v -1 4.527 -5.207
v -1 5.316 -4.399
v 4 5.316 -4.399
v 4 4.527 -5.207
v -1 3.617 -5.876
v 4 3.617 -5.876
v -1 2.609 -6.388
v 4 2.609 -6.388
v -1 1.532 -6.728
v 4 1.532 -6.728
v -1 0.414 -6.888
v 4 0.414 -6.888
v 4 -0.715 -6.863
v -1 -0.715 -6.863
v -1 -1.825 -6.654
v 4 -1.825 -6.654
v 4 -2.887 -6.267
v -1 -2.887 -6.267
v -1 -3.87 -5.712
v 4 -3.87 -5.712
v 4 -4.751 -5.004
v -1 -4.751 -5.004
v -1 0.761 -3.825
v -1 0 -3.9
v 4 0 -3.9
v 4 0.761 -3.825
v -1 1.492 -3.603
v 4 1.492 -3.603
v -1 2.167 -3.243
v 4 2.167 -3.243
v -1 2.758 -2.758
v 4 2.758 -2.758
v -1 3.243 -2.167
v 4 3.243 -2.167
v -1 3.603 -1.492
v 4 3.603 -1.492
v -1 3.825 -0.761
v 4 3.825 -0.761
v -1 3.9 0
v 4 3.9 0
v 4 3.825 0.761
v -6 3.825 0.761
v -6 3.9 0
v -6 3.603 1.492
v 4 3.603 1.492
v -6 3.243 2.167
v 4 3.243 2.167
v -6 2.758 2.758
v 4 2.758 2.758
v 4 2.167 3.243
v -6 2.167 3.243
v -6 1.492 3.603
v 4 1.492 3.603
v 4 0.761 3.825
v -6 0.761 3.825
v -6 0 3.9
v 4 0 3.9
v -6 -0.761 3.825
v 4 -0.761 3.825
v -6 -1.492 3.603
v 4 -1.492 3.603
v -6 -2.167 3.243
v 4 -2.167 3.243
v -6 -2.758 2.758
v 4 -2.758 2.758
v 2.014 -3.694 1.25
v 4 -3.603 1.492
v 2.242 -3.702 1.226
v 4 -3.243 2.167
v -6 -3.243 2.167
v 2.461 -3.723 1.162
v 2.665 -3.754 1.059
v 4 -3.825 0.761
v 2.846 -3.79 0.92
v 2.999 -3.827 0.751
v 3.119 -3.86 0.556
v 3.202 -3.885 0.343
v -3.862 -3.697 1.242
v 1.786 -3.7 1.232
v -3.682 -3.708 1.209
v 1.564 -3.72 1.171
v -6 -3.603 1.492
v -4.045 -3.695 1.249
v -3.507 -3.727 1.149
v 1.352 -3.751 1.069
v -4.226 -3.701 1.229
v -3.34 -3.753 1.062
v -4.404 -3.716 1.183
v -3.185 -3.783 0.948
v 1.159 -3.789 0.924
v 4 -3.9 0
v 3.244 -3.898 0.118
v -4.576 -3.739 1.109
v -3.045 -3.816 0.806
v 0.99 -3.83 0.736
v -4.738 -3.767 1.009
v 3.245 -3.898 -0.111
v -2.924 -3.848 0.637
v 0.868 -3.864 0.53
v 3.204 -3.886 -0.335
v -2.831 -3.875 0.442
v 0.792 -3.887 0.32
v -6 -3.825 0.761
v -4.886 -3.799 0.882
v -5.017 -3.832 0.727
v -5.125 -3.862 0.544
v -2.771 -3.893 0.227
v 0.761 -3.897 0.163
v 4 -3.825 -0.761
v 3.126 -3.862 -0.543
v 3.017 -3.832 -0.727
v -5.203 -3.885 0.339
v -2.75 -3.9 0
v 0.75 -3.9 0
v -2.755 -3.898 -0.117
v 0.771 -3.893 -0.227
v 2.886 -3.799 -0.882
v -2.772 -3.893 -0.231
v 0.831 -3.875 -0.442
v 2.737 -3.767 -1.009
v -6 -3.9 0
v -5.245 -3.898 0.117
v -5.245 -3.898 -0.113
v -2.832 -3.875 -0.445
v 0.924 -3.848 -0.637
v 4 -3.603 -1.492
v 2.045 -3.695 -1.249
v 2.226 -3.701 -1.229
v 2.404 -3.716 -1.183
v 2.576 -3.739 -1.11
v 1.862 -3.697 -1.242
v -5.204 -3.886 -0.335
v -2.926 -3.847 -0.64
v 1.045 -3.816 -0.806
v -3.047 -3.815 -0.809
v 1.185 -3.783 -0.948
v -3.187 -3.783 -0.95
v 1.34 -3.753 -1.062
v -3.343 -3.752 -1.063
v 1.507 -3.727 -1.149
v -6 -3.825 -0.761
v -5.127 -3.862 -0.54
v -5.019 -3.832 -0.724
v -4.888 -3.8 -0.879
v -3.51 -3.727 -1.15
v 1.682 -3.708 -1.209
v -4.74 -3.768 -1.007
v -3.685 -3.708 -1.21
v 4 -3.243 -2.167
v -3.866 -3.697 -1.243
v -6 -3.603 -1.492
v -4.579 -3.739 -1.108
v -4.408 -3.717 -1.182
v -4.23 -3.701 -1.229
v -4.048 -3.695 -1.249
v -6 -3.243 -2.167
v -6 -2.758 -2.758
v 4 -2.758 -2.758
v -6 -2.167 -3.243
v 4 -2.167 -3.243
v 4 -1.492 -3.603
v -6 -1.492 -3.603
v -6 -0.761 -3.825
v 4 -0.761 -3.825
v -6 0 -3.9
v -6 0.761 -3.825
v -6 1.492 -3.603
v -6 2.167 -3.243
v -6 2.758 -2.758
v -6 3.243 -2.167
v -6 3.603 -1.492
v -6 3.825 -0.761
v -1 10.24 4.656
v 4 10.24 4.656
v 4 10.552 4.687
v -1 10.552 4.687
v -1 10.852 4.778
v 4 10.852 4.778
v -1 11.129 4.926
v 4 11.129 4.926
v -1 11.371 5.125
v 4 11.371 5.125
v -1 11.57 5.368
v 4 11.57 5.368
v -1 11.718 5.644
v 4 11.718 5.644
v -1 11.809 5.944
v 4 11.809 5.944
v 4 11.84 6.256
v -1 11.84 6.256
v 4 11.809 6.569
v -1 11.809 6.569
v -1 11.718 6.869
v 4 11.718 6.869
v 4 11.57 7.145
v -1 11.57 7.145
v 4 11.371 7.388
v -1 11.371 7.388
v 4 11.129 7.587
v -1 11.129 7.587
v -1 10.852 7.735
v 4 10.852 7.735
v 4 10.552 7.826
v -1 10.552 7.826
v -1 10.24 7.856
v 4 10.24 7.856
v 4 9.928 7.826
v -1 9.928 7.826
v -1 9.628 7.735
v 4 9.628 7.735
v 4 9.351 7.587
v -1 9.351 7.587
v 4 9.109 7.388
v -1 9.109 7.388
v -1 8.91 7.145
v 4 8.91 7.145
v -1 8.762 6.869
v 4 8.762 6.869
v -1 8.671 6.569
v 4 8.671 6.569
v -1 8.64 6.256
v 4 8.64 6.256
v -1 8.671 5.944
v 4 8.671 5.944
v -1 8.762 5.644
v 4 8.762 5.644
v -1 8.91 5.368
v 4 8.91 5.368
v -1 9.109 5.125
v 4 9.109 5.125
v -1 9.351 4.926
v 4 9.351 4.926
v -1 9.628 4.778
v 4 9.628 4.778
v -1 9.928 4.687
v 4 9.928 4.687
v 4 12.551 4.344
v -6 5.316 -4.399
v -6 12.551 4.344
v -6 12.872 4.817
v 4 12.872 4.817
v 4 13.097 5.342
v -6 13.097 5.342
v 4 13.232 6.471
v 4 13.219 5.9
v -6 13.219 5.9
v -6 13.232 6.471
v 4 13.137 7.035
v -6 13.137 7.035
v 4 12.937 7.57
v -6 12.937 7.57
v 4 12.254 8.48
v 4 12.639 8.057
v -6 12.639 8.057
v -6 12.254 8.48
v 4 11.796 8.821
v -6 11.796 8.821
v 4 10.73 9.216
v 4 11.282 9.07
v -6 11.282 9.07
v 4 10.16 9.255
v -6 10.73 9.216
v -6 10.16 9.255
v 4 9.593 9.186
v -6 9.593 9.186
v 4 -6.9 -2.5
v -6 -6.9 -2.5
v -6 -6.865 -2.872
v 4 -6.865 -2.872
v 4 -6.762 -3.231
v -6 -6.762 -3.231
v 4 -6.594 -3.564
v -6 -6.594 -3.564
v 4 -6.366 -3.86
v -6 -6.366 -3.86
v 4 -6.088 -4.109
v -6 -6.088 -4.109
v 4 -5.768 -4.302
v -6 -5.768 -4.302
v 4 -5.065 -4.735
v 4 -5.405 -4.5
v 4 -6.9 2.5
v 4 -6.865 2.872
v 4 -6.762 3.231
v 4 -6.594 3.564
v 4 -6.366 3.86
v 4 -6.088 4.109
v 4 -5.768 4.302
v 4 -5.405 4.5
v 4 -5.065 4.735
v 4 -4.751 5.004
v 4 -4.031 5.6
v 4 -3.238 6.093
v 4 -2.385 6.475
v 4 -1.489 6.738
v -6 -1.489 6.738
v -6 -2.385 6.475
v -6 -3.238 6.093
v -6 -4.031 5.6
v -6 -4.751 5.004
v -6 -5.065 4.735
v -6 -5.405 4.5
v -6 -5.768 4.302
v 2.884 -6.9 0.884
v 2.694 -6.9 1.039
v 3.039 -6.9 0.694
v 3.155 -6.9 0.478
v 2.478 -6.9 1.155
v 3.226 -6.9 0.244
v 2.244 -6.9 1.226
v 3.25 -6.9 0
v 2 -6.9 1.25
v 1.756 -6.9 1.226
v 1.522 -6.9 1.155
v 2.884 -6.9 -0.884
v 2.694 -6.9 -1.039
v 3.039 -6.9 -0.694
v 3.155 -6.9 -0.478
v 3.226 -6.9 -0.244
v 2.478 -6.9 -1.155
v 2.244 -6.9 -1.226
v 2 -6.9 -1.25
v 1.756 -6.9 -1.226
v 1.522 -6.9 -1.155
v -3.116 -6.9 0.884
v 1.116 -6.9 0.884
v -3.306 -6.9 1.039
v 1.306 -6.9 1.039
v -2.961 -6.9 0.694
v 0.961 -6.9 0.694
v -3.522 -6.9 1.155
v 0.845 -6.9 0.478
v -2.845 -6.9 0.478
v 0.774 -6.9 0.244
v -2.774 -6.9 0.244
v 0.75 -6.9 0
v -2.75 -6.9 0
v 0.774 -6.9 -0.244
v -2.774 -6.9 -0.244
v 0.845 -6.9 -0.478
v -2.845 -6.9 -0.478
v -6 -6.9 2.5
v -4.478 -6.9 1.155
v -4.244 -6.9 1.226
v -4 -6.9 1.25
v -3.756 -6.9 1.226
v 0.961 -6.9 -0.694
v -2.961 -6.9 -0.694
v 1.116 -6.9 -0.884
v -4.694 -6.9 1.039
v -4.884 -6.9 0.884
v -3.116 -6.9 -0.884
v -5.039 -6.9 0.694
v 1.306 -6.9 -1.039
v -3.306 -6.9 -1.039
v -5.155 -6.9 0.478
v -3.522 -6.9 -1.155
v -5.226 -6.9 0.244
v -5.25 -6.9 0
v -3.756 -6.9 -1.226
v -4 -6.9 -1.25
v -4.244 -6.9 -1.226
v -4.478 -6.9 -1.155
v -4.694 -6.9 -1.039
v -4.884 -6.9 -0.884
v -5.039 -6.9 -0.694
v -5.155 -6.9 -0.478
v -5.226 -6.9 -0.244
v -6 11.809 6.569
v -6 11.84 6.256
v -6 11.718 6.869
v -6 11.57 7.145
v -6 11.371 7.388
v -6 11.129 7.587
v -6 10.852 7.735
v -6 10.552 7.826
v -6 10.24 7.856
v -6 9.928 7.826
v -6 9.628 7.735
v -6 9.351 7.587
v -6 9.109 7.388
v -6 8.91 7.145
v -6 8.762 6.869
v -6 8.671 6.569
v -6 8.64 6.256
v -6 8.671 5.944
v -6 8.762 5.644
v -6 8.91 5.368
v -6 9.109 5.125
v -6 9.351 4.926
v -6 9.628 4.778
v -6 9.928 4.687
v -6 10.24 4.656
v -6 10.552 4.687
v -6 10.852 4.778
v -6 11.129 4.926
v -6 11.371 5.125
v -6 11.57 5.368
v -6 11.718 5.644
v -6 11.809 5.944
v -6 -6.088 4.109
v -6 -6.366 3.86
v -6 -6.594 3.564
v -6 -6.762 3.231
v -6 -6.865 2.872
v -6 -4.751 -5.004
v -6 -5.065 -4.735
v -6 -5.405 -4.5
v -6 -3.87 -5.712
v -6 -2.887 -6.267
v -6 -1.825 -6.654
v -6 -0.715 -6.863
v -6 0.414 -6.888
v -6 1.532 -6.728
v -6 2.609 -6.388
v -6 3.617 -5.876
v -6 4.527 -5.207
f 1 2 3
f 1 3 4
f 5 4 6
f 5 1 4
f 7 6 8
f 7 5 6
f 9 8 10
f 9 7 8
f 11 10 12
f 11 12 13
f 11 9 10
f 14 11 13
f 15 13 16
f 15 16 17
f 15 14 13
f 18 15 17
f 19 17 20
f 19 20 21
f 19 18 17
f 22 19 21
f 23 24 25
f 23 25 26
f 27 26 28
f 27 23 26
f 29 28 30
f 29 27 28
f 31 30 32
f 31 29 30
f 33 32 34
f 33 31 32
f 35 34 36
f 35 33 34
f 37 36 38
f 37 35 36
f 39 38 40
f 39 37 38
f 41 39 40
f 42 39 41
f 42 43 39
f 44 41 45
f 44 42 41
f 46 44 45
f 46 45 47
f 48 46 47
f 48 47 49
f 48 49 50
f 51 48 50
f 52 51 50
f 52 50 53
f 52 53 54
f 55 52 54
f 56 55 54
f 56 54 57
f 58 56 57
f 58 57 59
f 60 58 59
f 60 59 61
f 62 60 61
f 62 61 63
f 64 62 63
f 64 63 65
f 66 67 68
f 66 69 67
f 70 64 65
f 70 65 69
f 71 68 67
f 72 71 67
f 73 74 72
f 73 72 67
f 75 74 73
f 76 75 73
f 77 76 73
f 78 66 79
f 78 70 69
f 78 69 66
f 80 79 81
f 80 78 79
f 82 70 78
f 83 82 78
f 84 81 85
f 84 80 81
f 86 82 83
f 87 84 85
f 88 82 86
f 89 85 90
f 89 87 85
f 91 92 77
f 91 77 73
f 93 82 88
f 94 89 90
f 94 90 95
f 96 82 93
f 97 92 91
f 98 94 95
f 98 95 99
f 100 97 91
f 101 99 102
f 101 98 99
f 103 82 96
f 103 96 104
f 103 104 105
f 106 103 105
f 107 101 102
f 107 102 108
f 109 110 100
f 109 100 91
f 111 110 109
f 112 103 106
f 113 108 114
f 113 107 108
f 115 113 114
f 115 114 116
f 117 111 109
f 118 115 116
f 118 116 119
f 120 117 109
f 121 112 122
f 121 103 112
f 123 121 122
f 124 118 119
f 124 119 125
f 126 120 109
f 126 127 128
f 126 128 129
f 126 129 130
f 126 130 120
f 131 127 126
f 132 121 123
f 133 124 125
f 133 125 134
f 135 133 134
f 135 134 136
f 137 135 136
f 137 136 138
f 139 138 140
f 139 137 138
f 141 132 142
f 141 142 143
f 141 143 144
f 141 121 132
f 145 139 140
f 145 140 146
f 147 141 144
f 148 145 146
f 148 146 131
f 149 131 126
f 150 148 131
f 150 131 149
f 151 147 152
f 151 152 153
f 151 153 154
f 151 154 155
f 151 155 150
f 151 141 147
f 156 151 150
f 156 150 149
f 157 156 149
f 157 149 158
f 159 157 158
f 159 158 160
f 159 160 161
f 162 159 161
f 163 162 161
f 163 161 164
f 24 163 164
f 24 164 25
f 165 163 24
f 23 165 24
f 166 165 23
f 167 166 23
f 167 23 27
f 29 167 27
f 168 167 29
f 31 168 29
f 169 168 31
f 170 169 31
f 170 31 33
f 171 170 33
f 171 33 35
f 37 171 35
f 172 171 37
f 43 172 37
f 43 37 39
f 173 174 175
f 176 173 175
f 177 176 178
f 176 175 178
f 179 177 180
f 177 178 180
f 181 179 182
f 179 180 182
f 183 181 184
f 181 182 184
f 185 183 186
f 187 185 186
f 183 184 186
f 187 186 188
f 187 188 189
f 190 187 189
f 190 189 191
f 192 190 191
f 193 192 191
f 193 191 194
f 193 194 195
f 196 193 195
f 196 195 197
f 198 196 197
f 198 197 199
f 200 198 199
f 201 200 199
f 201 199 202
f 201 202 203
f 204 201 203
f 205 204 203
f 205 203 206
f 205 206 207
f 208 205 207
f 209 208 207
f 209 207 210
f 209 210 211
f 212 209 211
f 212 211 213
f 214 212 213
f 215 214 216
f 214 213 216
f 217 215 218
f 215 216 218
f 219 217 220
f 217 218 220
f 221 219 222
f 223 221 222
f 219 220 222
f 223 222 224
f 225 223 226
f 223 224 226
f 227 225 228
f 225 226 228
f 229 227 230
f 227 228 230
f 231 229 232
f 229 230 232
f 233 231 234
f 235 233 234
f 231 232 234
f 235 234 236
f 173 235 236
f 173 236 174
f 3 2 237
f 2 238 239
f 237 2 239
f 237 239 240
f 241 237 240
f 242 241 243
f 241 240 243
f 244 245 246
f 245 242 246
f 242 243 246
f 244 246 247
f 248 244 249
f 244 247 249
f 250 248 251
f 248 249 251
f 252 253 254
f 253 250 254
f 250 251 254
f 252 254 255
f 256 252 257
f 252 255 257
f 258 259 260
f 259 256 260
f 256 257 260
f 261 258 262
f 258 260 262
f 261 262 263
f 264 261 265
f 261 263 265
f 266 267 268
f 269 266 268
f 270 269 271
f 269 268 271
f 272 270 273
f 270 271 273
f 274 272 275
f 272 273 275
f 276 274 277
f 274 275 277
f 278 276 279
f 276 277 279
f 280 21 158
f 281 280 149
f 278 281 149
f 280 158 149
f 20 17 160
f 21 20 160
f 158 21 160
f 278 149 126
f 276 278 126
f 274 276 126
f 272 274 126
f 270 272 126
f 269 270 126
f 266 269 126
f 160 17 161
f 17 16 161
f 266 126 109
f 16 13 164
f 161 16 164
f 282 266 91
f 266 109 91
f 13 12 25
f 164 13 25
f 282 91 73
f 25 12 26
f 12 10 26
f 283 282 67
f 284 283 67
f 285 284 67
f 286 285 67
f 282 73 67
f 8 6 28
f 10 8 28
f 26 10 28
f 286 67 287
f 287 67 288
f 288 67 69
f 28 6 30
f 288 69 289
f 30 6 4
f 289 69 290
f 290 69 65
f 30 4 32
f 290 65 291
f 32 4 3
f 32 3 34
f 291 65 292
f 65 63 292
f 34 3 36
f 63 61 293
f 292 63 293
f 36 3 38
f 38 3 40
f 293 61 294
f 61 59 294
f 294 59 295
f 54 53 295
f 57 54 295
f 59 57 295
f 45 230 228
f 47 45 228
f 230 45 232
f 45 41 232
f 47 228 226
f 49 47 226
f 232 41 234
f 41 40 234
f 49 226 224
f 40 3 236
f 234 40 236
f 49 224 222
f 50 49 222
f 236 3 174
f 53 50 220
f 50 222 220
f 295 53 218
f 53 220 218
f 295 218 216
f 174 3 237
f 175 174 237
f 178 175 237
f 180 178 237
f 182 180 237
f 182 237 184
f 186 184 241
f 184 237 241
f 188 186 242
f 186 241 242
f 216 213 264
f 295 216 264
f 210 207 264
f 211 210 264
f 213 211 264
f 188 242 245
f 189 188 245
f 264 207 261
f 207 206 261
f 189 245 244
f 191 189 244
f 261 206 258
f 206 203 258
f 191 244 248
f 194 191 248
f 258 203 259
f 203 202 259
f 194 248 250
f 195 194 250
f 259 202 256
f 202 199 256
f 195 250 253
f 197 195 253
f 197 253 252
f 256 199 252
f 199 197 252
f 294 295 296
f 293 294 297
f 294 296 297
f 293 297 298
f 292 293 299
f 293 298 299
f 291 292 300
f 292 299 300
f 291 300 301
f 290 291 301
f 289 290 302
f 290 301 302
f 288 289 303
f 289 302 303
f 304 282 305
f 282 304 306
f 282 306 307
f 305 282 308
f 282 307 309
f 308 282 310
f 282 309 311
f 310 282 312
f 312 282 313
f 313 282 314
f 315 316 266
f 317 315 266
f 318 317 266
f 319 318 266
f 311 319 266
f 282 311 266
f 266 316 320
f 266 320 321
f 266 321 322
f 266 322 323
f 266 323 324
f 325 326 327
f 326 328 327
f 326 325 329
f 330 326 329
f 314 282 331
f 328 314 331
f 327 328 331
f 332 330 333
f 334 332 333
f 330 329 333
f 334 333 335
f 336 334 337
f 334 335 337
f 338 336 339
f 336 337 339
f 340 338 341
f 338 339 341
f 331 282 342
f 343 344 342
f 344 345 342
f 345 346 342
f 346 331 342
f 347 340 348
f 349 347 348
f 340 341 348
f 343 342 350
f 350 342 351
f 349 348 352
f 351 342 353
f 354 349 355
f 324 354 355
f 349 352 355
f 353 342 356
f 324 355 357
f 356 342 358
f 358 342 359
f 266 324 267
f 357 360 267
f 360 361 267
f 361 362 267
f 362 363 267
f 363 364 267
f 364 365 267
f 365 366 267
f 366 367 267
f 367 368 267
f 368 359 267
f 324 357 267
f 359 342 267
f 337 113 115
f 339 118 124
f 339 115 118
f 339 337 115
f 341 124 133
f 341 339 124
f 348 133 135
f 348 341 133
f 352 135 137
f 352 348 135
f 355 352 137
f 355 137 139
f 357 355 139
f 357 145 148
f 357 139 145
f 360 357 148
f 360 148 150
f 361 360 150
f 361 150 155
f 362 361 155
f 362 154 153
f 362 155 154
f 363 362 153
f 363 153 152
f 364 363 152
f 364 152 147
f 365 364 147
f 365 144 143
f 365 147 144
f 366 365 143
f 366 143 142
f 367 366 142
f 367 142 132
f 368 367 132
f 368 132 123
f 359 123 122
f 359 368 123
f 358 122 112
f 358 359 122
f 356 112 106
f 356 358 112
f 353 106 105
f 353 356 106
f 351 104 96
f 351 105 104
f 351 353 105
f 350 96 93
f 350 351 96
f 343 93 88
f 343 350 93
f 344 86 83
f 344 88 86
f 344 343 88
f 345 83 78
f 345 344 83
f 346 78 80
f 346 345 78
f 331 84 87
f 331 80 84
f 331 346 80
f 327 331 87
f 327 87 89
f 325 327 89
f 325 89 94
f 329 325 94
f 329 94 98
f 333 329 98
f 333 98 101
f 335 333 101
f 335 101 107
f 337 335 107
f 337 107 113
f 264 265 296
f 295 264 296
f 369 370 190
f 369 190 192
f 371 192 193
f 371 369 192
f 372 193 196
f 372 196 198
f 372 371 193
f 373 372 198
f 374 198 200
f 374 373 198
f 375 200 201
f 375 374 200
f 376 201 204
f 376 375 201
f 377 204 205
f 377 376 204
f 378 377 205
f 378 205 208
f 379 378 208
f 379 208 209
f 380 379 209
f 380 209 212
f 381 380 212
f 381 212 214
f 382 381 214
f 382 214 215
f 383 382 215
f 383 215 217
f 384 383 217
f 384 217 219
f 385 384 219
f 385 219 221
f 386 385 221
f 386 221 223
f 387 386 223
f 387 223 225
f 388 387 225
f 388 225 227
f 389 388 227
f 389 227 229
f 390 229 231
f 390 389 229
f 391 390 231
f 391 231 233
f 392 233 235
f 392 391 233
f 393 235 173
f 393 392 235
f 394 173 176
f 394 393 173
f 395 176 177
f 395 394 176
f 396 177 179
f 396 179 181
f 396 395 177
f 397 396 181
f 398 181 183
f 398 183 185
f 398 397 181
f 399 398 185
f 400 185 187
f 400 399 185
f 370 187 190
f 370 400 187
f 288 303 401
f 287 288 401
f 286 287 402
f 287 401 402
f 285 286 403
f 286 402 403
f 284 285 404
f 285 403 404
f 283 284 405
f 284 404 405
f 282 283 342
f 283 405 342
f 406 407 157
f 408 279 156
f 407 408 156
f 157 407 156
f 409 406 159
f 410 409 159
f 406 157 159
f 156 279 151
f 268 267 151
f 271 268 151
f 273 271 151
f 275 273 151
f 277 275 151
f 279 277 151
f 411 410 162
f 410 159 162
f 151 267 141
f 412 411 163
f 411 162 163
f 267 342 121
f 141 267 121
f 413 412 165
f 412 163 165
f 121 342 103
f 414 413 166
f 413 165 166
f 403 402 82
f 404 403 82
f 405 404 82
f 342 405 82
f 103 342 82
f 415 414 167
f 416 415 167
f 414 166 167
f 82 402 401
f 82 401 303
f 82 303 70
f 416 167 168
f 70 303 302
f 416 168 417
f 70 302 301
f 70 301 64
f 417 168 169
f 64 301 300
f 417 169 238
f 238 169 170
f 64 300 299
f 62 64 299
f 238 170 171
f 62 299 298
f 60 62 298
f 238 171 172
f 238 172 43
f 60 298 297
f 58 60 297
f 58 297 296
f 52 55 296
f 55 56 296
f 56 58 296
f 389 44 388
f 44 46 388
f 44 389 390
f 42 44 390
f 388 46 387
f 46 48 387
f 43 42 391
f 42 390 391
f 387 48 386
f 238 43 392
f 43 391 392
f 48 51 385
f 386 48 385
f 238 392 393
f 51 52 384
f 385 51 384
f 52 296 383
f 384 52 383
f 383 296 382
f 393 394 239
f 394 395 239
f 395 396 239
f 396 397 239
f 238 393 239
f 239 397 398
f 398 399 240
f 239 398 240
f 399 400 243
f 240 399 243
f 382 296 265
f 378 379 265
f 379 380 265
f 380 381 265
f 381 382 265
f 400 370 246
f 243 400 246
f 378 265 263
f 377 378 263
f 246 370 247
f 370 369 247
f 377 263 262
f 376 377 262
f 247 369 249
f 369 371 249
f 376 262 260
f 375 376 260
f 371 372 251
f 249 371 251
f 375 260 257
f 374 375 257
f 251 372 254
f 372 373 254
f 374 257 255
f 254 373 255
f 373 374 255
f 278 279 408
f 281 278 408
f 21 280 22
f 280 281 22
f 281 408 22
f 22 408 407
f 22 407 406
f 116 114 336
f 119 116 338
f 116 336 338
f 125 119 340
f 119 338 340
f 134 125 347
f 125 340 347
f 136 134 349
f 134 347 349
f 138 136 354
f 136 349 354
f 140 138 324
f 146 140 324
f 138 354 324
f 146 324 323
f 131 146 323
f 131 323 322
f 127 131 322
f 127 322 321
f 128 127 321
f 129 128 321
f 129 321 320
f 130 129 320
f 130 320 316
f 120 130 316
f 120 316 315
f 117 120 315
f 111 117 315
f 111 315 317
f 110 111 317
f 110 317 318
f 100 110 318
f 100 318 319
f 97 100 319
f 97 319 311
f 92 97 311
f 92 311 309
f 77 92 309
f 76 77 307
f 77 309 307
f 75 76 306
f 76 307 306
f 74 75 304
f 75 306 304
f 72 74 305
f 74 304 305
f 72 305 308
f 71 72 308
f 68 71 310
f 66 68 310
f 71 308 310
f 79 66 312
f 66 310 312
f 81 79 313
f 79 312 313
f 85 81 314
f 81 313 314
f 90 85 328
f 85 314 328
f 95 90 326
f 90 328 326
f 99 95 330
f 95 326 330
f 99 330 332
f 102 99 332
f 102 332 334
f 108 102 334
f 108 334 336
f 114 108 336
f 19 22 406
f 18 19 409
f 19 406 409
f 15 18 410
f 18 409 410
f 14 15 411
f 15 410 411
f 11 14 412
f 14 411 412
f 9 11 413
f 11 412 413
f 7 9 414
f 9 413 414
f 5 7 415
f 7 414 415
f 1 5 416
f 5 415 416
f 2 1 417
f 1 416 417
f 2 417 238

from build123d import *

# Parameters (mm, degrees)
BOSS_EXTRUDE1_START    = -1
SKETCH2_R              = 3.9
BOSS_EXTRUDE1_DEPTH    = 5
M3_CLEARANCE_HOLE1_D   = 3.2
M3_TAPPED_HOLE1_REACH  = 24.345
M3_TAPPED_HOLE1_BORE_R = 1.25
MIRROR3_START          = -6
MIRROR3_OUTLINE_R      = 3.9
MIRROR3_OUTLINE_R_2    = 1.6
MIRROR3_DEPTH          = 5
MIRROR3_START_2        = -6.9
MIRROR3_2_OUTLINE_R    = 1.25
MIRROR3_2_DEPTH        = 3.205747808


with BuildPart() as part:
    # Sketch2 → Boss-Extrude1 (new body)
    with BuildSketch(Plane(origin=(0, 0, 0), x_dir=(0, 0, -1), z_dir=(1, 0, 0)).offset(BOSS_EXTRUDE1_START)):
        with BuildLine():
            Line((2.5, -6.9), (-2.5, -6.9))
            ThreePointArc((-2.5, -6.9), (-3.563882529, -6.593562507), (-4.301751563, -5.768153965))
            ThreePointArc((-4.301751563, -5.768153965), (-4.613436828, -5.232032538), (-5.004243793, -4.750530924))
            ThreePointArc((-5.004243793, -4.750530924), (-6.093212803, -3.237708717), (-6.737511079, -1.488604871))
            Line((-6.737511079, -1.488604871), (-9.185849324, 9.592714537))
            ThreePointArc((-9.185849324, 9.592714537), (-7.820620852, 12.799917558), (-4.343824749, 12.551142838))
            Line((-4.343824749, 12.551142838), (4.399145444, 5.315780221))
            ThreePointArc((4.399145444, 5.315780221), (6.88756759, 0.414020163), (5.004243793, -4.750530924))
            ThreePointArc((5.004243793, -4.750530924), (4.613436828, -5.232032538), (4.301751563, -5.768153965))
            ThreePointArc((4.301751563, -5.768153965), (3.563882529, -6.593562507), (2.5, -6.9))
        make_face()
        Circle(SKETCH2_R, mode=Mode.SUBTRACT)
    extrude(amount=BOSS_EXTRUDE1_DEPTH)

    # M3 Clearance Hole1 (through all)
    with Locations(Plane.ZY.offset(1)):
        with Locations((6.256496681, 10.239934047)):
            Hole(M3_CLEARANCE_HOLE1_D / 2)

    # M3 Tapped Hole1 bore → M3 Tapped Hole1 (cut, up to next)
    with BuildSketch(Plane(origin=(0, -6.9, 1.914772396), x_dir=(-1, 0, 0), z_dir=(0, -1, 0)), mode=Mode.PRIVATE) as m3_tapped_hole1_sk1:
        with Locations((-2, 1.914772396)):
            Circle(M3_TAPPED_HOLE1_BORE_R)
    m3_tapped_hole1_tool1 = extrude(m3_tapped_hole1_sk1.sketch, amount=-M3_TAPPED_HOLE1_REACH, mode=Mode.PRIVATE) & part.part
    add(m3_tapped_hole1_tool1.solids().sort_by_distance((2, -6.9, 0))[0], mode=Mode.SUBTRACT)

    # Mirror3: read off the stored shape, not the designer's step
    # Mirror3 outline → Mirror3 (add)
    with BuildSketch(Plane.YZ.offset(MIRROR3_START)):
        with BuildLine():
            ThreePointArc((-4.750530924, -5.004243793), (0.414020162, -6.88756759), (5.315780221, -4.399145444))
            Line((5.315780221, -4.399145444), (12.551142838, 4.343824749))
            ThreePointArc((12.551142838, 4.343824749), (12.799917558, 7.820620852), (9.592714537, 9.185849324))
            Line((9.592714537, 9.185849324), (-1.488604871, 6.737511079))
            ThreePointArc((-1.488604871, 6.737511079), (-3.237708717, 6.093212803), (-4.750530924, 5.004243793))
            ThreePointArc((-4.750530924, 5.004243793), (-5.232032538, 4.613436828), (-5.768153965, 4.301751563))
            ThreePointArc((-5.768153965, 4.301751563), (-6.593562507, 3.563882529), (-6.9, 2.5))
            Line((-6.9, 2.5), (-6.9, -2.5))
            ThreePointArc((-6.9, -2.5), (-6.593562507, -3.563882529), (-5.768153965, -4.301751563))
            ThreePointArc((-5.768153965, -4.301751563), (-5.232032538, -4.613436828), (-4.750530924, -5.004243793))
        make_face()
        Circle(MIRROR3_OUTLINE_R, mode=Mode.SUBTRACT)
        with Locations((10.239934047, 6.256496681)):
            Circle(MIRROR3_OUTLINE_R_2, mode=Mode.SUBTRACT)
    extrude(amount=MIRROR3_DEPTH)

    # Mirror3 2 outline → Mirror3 2 (cut)
    with BuildSketch(Plane(origin=(0, 0, 0), x_dir=(1, 0, 0), z_dir=(0, 1, 0)).offset(MIRROR3_START_2)):
        with Locations((-4, 0)):
            Circle(MIRROR3_2_OUTLINE_R)
    extrude(amount=MIRROR3_2_DEPTH, mode=Mode.SUBTRACT)


solid = part.part
